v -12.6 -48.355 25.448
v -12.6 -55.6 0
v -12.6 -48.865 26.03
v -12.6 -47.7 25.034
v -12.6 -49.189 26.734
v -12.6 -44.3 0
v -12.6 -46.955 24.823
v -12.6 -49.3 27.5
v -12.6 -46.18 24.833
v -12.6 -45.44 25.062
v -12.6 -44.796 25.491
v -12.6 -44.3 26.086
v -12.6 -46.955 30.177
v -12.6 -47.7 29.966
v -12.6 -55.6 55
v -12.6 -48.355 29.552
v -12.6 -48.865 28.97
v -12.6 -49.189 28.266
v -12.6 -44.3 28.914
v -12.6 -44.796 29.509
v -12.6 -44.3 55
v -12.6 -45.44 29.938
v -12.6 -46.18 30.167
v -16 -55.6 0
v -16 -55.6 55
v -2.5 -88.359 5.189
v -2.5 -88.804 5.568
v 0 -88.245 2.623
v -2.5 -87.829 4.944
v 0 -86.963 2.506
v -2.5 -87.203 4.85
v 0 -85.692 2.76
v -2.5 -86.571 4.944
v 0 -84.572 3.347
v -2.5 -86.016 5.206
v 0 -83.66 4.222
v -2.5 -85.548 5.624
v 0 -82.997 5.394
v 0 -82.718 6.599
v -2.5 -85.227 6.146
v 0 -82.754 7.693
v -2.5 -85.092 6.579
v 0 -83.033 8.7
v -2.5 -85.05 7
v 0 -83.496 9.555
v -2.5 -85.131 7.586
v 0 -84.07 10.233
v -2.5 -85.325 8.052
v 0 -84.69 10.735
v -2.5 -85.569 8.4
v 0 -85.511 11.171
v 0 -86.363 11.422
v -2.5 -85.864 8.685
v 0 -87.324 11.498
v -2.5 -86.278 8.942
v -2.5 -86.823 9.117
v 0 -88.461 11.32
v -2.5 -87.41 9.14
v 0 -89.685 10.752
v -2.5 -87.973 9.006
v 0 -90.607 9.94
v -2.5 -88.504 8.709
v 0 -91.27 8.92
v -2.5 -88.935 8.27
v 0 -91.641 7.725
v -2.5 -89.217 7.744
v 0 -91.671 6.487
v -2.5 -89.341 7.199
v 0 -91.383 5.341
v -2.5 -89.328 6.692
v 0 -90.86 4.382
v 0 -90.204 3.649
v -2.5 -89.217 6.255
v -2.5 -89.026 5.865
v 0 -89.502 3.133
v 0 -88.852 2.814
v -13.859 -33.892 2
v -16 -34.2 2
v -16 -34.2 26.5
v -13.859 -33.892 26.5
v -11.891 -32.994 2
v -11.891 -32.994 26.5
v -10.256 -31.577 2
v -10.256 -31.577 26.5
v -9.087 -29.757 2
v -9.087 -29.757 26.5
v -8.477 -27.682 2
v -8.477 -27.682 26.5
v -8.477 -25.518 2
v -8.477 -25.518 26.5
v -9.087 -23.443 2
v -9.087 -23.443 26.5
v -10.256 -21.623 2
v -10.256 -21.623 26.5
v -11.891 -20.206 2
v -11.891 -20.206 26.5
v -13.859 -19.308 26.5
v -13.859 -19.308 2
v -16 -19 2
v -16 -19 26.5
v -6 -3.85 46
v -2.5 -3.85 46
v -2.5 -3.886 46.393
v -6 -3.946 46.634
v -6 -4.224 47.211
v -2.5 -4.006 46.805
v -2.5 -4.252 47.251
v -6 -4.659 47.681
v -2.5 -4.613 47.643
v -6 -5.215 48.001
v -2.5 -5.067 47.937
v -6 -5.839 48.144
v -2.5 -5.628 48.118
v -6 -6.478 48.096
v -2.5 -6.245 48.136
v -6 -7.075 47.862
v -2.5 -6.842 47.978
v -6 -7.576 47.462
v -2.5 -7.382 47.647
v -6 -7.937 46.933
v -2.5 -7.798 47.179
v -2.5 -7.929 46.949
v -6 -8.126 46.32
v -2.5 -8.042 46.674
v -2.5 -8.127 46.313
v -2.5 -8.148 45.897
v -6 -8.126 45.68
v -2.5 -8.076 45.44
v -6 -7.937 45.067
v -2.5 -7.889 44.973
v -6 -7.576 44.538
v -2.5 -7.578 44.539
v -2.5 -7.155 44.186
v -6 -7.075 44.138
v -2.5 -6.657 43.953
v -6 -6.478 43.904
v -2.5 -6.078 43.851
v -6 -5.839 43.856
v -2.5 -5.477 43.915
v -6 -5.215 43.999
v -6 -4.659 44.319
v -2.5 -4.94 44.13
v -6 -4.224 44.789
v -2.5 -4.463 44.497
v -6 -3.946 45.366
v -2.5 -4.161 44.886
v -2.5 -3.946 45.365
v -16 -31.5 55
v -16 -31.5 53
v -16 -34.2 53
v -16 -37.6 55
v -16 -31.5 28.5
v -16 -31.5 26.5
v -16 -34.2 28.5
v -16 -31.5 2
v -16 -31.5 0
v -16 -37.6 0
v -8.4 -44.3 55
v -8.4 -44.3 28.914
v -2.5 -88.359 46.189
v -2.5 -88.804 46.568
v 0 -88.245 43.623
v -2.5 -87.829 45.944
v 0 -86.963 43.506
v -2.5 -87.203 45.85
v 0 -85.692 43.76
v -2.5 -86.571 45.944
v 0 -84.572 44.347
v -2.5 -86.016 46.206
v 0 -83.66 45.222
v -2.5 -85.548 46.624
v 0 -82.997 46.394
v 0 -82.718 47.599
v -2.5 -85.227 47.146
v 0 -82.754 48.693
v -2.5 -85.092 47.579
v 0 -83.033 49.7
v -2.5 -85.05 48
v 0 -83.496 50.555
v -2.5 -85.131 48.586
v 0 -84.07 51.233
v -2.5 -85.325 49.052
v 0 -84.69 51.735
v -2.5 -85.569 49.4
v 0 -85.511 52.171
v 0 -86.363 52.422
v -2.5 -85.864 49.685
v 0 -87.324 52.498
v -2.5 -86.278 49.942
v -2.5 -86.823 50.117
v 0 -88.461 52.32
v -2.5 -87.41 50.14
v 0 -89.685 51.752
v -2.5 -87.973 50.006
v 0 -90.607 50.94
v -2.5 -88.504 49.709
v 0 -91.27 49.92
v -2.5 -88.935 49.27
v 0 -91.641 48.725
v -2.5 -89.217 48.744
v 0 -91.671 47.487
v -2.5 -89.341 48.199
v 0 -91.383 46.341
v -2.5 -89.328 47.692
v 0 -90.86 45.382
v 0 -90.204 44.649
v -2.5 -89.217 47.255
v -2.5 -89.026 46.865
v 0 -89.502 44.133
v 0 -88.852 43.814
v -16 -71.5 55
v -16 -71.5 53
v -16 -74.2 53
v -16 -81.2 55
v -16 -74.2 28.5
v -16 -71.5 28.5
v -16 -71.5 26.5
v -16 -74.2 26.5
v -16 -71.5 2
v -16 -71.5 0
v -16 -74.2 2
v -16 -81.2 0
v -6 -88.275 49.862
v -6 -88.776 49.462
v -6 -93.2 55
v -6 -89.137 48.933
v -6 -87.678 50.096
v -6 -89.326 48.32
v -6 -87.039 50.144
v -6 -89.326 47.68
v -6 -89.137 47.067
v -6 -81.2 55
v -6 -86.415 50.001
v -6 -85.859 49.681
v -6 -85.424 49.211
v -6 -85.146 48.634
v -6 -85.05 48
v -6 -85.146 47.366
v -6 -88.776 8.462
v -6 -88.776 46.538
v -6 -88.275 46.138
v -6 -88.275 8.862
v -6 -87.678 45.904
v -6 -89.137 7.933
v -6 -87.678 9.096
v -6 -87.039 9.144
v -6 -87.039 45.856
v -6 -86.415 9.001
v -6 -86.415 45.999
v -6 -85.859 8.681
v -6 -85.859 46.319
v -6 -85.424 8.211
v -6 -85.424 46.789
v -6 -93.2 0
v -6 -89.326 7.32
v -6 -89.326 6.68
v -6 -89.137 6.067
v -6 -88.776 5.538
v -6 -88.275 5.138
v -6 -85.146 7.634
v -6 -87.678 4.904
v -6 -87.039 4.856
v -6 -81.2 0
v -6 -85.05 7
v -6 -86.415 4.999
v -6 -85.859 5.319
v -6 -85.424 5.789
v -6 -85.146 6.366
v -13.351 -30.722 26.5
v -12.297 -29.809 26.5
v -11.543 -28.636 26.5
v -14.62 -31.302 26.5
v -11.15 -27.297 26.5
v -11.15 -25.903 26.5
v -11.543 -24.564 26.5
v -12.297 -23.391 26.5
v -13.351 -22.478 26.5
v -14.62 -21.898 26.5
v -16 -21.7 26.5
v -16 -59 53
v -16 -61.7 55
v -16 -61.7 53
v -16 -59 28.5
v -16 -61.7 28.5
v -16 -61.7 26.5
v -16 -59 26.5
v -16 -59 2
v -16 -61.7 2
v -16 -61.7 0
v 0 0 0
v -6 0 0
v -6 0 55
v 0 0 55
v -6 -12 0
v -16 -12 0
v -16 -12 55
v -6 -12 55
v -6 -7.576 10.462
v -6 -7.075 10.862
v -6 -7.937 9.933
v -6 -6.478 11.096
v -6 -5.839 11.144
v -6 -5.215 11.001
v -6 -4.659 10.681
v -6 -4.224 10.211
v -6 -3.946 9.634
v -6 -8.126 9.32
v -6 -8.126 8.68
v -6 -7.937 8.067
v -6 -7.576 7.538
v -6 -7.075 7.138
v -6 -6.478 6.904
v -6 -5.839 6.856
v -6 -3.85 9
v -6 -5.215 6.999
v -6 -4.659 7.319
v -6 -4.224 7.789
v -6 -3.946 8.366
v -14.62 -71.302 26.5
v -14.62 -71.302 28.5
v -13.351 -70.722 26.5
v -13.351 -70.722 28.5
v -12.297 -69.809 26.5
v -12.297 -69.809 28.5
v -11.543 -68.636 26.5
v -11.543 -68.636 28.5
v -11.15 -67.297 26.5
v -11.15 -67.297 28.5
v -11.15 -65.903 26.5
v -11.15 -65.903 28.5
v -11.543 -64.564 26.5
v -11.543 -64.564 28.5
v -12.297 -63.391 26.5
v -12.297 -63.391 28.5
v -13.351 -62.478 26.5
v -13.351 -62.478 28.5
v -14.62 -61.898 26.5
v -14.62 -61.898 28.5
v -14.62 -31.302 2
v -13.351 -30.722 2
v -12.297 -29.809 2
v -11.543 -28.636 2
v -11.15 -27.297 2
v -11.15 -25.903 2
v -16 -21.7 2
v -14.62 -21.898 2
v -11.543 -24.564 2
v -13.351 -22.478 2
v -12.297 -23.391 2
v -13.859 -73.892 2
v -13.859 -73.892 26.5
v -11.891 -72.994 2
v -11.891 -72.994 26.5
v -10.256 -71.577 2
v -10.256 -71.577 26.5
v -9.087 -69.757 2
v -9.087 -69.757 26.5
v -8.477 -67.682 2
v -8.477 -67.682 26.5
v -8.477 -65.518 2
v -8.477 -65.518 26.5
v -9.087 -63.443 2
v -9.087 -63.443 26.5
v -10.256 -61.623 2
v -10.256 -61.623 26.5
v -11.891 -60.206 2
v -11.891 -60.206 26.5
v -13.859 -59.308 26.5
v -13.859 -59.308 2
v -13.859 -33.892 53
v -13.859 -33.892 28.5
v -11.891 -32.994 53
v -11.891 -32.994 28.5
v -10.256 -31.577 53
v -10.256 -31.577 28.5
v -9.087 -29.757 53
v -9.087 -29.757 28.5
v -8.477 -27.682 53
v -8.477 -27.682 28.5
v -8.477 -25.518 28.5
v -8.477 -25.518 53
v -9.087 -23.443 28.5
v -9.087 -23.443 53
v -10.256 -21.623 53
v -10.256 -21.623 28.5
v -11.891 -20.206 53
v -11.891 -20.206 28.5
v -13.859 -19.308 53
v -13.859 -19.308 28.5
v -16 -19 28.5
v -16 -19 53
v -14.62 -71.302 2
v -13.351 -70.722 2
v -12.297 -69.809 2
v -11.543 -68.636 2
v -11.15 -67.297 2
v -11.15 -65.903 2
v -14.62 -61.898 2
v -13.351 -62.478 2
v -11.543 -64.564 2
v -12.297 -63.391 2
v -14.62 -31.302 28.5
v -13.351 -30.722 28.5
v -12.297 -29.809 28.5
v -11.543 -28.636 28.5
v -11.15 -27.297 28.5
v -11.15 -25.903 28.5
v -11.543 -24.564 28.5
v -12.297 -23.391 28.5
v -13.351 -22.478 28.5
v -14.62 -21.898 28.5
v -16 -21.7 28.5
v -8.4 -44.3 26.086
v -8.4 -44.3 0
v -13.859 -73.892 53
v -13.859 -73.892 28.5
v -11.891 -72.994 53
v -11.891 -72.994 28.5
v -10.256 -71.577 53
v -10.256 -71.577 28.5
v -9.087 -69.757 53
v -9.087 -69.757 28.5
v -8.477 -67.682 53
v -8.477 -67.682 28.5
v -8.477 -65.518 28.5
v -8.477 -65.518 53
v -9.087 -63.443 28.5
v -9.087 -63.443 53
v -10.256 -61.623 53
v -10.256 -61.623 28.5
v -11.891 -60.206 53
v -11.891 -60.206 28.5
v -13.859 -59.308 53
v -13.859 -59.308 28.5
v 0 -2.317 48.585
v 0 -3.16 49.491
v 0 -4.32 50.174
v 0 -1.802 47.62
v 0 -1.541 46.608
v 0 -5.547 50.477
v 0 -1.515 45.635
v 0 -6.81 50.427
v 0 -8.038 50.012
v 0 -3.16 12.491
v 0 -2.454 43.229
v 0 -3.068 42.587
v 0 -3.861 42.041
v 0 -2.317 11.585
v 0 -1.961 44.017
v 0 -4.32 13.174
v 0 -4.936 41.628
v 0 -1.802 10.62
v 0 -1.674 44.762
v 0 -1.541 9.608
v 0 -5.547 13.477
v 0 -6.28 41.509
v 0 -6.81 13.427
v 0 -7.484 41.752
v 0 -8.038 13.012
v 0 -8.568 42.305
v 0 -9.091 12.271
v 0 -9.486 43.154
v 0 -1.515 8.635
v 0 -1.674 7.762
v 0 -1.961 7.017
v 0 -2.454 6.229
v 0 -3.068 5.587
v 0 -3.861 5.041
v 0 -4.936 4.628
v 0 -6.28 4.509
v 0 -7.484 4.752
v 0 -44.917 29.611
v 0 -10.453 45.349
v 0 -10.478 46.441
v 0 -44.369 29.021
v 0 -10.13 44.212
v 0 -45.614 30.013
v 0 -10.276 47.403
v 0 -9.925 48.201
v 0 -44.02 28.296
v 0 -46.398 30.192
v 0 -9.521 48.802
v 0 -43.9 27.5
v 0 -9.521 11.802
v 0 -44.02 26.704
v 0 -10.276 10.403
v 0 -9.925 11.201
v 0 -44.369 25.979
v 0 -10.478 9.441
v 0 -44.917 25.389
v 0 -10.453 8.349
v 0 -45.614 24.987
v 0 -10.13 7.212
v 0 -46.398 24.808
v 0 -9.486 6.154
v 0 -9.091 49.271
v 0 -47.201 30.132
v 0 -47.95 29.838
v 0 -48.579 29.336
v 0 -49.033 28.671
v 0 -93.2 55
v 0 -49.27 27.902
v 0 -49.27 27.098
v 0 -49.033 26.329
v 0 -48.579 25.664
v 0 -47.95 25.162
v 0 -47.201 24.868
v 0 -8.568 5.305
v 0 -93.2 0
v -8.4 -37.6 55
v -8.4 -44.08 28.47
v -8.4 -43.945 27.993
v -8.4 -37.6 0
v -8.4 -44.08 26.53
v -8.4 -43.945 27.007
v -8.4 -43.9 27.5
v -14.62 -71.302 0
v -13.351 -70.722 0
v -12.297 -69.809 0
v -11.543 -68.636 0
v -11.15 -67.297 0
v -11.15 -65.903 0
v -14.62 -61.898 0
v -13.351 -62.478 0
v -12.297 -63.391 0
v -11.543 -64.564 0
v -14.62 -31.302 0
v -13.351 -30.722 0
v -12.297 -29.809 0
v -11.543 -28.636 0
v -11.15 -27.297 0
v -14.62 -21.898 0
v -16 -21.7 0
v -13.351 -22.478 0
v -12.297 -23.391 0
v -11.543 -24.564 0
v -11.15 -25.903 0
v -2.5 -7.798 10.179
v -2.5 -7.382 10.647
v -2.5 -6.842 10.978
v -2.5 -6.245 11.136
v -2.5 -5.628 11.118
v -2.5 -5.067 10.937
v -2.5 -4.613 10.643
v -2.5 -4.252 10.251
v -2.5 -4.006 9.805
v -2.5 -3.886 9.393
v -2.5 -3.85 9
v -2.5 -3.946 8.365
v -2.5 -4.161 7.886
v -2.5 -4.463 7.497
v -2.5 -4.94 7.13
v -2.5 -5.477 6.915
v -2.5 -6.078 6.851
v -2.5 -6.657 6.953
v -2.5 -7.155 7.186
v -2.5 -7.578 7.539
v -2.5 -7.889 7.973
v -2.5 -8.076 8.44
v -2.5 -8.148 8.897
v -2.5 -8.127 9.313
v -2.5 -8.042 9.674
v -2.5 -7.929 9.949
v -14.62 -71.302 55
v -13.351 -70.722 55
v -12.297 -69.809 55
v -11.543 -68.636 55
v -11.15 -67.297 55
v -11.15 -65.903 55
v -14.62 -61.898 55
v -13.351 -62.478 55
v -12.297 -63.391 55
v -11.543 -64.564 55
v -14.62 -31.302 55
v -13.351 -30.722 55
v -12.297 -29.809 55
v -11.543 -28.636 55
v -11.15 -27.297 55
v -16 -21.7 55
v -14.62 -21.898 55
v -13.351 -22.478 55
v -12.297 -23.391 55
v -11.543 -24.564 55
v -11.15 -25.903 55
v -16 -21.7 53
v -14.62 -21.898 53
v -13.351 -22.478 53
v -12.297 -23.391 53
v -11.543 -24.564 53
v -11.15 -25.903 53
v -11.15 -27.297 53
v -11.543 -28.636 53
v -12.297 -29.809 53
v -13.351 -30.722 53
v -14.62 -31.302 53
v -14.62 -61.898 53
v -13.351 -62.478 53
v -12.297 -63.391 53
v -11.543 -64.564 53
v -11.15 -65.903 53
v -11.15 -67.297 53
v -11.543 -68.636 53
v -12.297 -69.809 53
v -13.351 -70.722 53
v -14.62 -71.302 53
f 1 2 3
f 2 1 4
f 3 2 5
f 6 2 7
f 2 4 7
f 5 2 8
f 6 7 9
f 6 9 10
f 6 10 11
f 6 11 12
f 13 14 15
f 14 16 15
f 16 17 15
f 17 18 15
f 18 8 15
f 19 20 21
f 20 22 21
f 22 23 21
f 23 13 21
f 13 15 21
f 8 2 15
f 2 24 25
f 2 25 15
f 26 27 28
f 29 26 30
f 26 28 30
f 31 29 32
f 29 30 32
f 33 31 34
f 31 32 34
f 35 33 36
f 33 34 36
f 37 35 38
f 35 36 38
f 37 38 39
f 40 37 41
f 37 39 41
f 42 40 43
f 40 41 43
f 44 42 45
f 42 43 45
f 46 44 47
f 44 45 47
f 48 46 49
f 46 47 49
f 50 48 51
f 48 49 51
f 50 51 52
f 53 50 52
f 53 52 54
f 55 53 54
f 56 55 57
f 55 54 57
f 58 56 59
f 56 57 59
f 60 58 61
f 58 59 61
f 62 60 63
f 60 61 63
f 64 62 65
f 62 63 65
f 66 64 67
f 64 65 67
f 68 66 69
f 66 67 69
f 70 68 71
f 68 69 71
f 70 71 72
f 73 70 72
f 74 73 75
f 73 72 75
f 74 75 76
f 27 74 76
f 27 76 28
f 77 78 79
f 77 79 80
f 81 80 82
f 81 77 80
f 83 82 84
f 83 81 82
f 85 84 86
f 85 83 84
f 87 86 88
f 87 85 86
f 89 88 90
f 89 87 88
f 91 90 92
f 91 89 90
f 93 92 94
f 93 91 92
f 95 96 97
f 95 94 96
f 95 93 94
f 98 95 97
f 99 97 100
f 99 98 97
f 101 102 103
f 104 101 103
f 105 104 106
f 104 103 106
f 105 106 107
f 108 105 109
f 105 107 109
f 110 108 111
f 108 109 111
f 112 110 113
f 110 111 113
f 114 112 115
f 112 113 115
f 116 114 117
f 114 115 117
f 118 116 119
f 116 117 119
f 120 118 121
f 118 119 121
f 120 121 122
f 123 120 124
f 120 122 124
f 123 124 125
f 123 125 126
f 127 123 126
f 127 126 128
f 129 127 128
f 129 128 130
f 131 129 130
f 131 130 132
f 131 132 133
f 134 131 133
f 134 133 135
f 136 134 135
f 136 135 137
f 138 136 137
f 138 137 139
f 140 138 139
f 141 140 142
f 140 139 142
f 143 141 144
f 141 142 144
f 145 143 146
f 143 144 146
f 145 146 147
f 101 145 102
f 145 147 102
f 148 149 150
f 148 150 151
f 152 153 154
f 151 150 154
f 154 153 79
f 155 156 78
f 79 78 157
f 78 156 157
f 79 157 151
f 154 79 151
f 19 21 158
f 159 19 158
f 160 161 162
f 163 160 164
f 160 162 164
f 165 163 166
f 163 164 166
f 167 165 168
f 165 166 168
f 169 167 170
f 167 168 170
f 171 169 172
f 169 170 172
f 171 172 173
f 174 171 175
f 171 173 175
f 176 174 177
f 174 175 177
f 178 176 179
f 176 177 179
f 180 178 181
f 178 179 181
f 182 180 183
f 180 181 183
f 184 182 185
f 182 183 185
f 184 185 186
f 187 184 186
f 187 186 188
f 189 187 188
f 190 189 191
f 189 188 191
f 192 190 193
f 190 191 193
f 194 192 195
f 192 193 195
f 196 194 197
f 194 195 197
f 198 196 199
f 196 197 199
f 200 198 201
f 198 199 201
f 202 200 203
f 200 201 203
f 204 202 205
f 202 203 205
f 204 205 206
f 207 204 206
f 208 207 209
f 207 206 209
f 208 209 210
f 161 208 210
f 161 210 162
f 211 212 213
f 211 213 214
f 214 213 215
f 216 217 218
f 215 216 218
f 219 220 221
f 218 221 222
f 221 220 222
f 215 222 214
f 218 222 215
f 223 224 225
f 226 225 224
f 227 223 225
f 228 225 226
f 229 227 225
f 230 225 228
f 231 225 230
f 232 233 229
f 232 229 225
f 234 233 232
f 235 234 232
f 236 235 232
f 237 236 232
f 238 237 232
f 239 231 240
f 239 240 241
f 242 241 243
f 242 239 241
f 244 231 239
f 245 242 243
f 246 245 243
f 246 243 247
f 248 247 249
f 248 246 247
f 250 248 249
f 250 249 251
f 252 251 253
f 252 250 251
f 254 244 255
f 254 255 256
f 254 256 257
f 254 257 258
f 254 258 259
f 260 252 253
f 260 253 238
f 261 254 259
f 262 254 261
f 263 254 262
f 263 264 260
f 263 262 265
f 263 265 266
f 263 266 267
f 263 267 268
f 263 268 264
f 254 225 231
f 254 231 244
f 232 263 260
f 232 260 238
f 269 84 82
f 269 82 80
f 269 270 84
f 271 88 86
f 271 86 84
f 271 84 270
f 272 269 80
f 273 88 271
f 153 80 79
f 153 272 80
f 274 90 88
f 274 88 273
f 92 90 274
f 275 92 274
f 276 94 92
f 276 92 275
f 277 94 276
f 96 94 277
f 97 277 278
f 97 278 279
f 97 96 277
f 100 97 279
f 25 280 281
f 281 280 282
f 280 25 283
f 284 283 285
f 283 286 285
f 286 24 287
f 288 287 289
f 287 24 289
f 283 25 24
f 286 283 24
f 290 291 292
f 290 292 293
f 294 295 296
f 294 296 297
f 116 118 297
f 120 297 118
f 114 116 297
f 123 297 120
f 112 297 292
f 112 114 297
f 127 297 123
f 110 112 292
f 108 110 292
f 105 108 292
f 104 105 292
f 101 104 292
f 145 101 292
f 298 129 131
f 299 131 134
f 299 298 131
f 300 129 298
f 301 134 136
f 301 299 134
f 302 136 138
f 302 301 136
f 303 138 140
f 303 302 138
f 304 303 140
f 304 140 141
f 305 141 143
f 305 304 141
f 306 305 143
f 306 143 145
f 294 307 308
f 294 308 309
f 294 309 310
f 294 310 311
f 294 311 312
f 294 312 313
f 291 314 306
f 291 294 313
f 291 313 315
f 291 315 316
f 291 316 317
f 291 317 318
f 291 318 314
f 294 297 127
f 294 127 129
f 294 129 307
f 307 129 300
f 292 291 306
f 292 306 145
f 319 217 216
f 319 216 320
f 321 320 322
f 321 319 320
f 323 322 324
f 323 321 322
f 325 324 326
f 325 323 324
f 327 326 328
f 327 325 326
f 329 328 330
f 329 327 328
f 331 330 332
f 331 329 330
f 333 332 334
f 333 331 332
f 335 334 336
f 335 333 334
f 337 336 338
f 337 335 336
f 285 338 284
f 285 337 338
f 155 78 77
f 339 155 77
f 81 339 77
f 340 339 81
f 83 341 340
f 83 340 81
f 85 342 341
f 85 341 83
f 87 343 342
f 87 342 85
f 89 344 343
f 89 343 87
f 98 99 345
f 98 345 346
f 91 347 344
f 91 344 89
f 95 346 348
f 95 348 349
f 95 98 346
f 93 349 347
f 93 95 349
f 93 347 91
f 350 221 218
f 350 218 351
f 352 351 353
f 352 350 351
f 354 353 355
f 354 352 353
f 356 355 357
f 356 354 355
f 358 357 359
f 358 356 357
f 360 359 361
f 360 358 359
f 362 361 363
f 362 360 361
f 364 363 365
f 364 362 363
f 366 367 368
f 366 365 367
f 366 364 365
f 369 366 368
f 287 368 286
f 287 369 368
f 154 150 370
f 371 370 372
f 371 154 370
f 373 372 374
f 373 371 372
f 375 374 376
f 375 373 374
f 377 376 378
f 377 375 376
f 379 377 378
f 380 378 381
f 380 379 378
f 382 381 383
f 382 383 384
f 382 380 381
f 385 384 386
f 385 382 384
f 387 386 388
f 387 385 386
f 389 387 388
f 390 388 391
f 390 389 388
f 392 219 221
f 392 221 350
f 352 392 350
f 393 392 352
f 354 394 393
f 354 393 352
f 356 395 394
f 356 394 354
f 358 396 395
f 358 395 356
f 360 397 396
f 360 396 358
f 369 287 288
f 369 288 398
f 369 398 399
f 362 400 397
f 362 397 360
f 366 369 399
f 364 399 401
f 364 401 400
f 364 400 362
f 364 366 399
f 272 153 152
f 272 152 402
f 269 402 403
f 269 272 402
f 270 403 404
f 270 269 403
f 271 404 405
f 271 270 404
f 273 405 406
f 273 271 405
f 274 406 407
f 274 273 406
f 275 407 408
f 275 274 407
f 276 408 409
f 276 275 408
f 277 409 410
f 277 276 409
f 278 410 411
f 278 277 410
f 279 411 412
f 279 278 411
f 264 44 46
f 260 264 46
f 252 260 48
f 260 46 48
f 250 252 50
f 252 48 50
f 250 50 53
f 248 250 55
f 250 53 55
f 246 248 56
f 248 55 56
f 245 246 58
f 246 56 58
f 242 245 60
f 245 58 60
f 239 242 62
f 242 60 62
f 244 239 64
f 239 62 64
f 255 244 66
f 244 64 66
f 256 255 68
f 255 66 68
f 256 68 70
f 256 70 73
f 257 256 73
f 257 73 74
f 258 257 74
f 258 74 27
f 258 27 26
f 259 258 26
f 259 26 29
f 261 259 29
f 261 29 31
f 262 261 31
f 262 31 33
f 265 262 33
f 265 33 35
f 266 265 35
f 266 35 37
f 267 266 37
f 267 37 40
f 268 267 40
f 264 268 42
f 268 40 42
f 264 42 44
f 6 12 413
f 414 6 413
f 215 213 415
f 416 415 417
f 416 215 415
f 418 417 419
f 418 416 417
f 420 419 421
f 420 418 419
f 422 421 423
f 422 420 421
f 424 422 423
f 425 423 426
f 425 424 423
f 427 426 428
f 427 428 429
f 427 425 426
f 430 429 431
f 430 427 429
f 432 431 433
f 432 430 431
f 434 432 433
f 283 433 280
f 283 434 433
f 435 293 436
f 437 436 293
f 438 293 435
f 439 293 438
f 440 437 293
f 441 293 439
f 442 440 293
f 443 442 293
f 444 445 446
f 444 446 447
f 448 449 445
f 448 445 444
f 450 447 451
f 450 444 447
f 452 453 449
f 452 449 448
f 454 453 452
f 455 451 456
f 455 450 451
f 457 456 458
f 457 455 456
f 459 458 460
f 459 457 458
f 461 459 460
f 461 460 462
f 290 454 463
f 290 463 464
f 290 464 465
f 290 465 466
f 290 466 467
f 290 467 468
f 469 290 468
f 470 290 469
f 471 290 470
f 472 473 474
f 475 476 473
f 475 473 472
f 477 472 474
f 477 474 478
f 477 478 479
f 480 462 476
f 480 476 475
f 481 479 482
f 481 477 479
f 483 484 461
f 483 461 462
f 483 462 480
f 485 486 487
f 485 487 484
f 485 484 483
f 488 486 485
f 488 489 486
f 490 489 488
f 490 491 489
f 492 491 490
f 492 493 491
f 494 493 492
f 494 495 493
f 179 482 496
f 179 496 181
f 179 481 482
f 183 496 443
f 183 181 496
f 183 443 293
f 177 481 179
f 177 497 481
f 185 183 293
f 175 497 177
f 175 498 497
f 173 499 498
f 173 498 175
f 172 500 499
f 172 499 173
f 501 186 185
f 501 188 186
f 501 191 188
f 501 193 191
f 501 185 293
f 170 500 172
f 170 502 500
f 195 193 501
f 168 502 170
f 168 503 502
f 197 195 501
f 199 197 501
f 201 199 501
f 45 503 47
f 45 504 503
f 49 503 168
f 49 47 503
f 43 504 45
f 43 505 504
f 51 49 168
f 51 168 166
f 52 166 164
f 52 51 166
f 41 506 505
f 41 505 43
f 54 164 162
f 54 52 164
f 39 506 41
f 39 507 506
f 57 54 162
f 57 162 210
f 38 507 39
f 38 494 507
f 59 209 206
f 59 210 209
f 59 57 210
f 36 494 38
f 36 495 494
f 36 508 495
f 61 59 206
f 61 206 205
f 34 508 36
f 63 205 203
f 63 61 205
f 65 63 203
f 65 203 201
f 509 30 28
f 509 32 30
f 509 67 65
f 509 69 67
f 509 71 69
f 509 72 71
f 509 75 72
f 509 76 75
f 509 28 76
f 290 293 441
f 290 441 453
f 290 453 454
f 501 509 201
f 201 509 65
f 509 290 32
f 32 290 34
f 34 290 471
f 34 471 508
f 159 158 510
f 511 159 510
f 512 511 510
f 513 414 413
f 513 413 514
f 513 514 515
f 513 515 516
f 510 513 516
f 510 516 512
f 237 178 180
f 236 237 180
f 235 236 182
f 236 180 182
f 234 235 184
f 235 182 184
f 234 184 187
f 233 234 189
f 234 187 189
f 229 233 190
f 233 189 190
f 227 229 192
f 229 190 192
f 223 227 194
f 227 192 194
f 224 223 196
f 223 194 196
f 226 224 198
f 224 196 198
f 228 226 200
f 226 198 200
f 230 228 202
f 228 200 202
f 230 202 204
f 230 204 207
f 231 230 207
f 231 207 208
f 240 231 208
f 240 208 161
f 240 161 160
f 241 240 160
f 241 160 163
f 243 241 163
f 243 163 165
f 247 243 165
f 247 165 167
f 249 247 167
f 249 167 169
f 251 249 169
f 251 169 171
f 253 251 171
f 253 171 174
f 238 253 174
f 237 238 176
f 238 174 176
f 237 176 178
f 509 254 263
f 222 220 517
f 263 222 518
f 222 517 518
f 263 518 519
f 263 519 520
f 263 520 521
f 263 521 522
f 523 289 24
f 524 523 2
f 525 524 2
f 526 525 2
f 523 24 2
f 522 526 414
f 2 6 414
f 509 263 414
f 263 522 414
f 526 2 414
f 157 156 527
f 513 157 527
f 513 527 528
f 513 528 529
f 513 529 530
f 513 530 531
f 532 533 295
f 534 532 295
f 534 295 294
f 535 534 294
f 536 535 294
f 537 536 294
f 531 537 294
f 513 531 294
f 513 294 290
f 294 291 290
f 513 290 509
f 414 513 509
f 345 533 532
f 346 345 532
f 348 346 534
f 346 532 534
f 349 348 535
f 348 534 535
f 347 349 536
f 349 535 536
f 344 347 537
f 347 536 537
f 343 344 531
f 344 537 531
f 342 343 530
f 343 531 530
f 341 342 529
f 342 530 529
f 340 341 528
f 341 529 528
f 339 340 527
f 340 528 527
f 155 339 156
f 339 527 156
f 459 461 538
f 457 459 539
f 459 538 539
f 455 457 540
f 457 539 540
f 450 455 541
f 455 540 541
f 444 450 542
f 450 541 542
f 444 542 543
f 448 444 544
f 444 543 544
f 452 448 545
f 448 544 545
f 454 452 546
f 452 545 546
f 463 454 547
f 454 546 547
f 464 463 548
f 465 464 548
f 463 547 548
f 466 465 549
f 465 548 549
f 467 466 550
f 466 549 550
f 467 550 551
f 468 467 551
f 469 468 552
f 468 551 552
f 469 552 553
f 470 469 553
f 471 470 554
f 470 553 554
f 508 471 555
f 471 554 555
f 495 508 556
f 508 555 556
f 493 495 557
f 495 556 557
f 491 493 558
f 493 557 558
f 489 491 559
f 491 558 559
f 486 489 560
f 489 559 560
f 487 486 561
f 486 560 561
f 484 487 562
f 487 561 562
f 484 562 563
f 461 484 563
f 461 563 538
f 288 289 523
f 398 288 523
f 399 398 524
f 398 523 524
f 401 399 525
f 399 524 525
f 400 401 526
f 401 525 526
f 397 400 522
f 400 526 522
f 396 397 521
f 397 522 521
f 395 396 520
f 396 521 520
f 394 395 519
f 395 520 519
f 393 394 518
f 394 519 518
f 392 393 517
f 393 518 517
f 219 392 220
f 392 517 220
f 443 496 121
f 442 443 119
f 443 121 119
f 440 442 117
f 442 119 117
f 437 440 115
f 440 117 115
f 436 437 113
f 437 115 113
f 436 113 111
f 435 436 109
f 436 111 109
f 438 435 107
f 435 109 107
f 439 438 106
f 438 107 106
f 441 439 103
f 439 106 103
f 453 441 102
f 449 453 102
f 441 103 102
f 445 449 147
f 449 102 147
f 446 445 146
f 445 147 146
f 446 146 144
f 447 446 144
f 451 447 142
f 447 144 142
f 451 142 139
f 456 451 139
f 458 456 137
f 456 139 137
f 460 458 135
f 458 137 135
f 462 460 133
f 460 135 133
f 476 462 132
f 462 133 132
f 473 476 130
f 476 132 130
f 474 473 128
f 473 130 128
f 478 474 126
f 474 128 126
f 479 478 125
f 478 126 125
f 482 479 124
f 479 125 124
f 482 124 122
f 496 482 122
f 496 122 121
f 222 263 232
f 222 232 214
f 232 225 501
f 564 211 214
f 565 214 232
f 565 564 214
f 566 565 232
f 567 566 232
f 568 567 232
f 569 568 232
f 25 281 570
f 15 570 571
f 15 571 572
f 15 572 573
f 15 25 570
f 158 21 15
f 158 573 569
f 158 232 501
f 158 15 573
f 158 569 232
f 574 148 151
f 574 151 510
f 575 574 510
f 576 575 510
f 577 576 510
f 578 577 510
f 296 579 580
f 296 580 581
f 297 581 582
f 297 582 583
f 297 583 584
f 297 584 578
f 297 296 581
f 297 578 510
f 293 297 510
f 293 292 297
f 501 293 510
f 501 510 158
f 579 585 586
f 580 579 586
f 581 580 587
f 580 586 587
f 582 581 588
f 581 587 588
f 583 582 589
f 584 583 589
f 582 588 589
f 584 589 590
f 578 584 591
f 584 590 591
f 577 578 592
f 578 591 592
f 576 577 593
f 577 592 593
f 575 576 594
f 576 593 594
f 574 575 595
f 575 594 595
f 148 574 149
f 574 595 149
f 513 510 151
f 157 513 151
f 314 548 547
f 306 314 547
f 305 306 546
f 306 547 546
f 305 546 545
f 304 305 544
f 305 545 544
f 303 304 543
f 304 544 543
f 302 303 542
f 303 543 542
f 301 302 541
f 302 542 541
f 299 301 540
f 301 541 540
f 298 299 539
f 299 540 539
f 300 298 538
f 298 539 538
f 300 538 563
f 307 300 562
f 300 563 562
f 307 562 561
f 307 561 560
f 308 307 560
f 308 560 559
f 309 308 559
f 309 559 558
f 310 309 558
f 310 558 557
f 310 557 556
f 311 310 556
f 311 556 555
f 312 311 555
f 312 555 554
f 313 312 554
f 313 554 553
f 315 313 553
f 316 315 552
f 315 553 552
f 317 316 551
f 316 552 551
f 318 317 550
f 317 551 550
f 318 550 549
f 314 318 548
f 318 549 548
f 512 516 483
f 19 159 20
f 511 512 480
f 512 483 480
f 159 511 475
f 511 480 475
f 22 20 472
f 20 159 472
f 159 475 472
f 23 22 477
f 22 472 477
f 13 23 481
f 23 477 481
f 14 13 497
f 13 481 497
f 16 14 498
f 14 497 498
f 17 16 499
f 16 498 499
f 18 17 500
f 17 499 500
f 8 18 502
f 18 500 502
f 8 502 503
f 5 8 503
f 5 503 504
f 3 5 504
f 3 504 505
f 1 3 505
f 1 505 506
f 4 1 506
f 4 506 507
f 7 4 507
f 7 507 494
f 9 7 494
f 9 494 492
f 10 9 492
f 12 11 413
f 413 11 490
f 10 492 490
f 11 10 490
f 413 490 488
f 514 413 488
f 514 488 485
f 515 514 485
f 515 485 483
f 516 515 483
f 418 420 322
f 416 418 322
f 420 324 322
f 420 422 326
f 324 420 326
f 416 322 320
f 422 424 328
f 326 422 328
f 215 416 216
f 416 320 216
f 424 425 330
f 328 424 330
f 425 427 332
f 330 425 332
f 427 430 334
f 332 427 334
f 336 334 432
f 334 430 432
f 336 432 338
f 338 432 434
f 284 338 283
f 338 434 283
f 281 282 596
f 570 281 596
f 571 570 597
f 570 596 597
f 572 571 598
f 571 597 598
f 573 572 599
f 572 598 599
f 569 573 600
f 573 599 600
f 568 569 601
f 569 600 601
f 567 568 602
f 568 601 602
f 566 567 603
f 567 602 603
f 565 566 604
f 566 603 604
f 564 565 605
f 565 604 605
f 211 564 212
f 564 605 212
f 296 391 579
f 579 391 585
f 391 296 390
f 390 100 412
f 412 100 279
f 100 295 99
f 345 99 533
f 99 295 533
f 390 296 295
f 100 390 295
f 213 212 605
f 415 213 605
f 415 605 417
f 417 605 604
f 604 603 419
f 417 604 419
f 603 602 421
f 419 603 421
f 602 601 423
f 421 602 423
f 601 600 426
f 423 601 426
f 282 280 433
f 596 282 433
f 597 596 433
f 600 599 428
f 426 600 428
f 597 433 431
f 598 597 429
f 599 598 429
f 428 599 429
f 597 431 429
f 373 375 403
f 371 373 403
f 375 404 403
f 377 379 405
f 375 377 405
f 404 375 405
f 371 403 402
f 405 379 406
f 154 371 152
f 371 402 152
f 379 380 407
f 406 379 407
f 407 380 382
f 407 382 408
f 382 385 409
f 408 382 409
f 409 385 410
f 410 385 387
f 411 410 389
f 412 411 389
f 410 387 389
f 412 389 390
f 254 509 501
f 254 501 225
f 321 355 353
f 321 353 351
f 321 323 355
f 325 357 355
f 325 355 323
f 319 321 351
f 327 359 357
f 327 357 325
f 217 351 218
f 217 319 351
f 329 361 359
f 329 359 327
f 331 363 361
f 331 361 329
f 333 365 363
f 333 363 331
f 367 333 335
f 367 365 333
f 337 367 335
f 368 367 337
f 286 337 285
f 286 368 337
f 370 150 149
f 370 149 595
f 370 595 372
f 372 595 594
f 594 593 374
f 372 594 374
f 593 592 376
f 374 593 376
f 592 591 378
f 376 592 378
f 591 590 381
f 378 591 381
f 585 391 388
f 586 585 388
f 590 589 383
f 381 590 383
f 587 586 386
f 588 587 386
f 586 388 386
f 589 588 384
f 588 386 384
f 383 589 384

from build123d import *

# Parameters (mm, degrees)
BOSS_EXTRUDE1_DEPTH = 55
BOSS_EXTRUDE2_START = 2
BOSS_EXTRUDE2_DEPTH = 2
BOSS_EXTRUDE3_START = 2
BOSS_EXTRUDE3_DEPTH = 2
BOSS_EXTRUDE5_START = 2
BOSS_EXTRUDE5_DEPTH = 2
BOSS_EXTRUDE6_DEPTH = 2
SKETCH7_W           = 3.4
SKETCH7_H           = 11.3
CUT_EXTRUDE2_DEPTH  = 55
SKETCH8_R           = 2.15
CUT_EXTRUDE3_DEPTH  = 6
CUT_EXTRUDE4_REACH  = 111.395
SKETCH9_R           = 2.7
LPATTERN1_COUNT     = 2
LPATTERN1_PITCH     = 37
LPATTERN2_COUNT     = 2
LPATTERN2_PITCH     = 41


with BuildPart() as part:
    # Sketch1 → Boss-Extrude1 (new body)
    with BuildSketch(Plane.XY):
        with BuildLine():
            Line((0, 0), (0, -93.2))
            Line((0, -93.2), (-6, -93.2))
            Line((-6, -93.2), (-6, -81.2))
            Line((-6, -81.2), (-16, -81.2))
            Line((-16, -81.2), (-16, -74.2))
            ThreePointArc((-16, -74.2), (-8.4, -66.6), (-16, -59))
            Line((-16, -59), (-16, -44.3))
            Line((-16, -44.3), (-8.4, -44.3))
            Line((-8.4, -44.3), (-8.4, -37.6))
            Line((-8.4, -37.6), (-16, -37.6))
            Line((-16, -37.6), (-16, -34.2))
            ThreePointArc((-16, -34.2), (-8.4, -26.6), (-16, -19))
            Line((-16, -19), (-16, -12))
            Line((-16, -12), (-6, -12))
            Line((-6, -12), (-6, 0))
            Line((-6, 0), (0, 0))
        make_face()
    extrude(amount=BOSS_EXTRUDE1_DEPTH)

    # Sketch2 → Boss-Extrude2 (add)
    with BuildSketch(Plane(origin=(0, 0, 28.5), x_dir=(-1, 0, 0), z_dir=(0, 0, -1)).offset(BOSS_EXTRUDE2_START)):
        with BuildLine():
            Line((16, -34.2), (16, -31.5))
            ThreePointArc((16, -31.5), (11.1, -26.6), (16, -21.7))
            Line((16, -21.7), (16, -19))
            ThreePointArc((16, -19), (8.4, -26.6), (16, -34.2))
        make_face()
    extrude(amount=-BOSS_EXTRUDE2_DEPTH)

    # Sketch3 → Boss-Extrude3 (add)
    with BuildSketch(Plane(origin=(0, 0, 28.5), x_dir=(-1, 0, 0), z_dir=(0, 0, -1)).offset(BOSS_EXTRUDE3_START)):
        with BuildLine():
            Line((16, -74.2), (16, -71.5))
            ThreePointArc((16, -71.5), (11.1, -66.6), (16, -61.7))
            Line((16, -61.7), (16, -59))
            ThreePointArc((16, -59), (8.4, -66.6), (16, -74.2))
        make_face()
    extrude(amount=-BOSS_EXTRUDE3_DEPTH)

    # Sketch4 → Boss-Extrude5 (add)
    with BuildSketch(Plane(origin=(0, 0, 2), x_dir=(-1, 0, 0), z_dir=(0, 0, -1)).offset(BOSS_EXTRUDE5_START)):
        with BuildLine():
            Line((16, -59), (16, -61.7))
            ThreePointArc((16, -61.7), (11.1, -66.6), (16, -71.5))
            Line((16, -71.5), (16, -74.2))
            ThreePointArc((16, -74.2), (8.4, -66.6), (16, -59))
        make_face()
        with BuildLine():
            Line((16, -19), (16, -21.7))
            ThreePointArc((16, -21.7), (11.1, -26.6), (16, -31.5))
            Line((16, -31.5), (16, -34.2))
            ThreePointArc((16, -34.2), (8.4, -26.6), (16, -19))
        make_face()
    extrude(amount=-BOSS_EXTRUDE5_DEPTH)

    # Sketch5 → Boss-Extrude6 (add)
    with BuildSketch(Plane(origin=(0, 0, 53), x_dir=(-1, 0, 0), z_dir=(0, 0, -1))):
        with BuildLine():
            Line((16, -19), (16, -21.7))
            ThreePointArc((16, -21.7), (11.1, -26.6), (16, -31.5))
            Line((16, -31.5), (16, -34.2))
            ThreePointArc((16, -34.2), (8.4, -26.6), (16, -19))
        make_face()
        with BuildLine():
            Line((16, -59), (16, -61.7))
            ThreePointArc((16, -61.7), (11.1, -66.6), (16, -71.5))
            Line((16, -71.5), (16, -74.2))
            ThreePointArc((16, -74.2), (8.4, -66.6), (16, -59))
        make_face()
    extrude(amount=-BOSS_EXTRUDE6_DEPTH)

    # Sketch7 → Cut-Extrude2 (cut)
    with BuildSketch(Plane.XY.offset(55)):
        with Locations((-14.3, -49.95)):
            Rectangle(SKETCH7_W, SKETCH7_H)
    extrude(amount=-CUT_EXTRUDE2_DEPTH, mode=Mode.SUBTRACT)

    # Sketch8 → Cut-Extrude3 (cut)
    with BuildSketch(Plane(origin=(0, 0, 0), x_dir=(0, 0, -1), z_dir=(1, 0, 0))):
        with Locations(Location((-46, -6, 0), (0, 0, 90))):
            Circle(SKETCH8_R)
        with Locations(Location((-9, -6, 0), (0, 0, 90))):
            Circle(SKETCH8_R)
        with Locations(Location((-7, -87.2, 0), (0, 0, 90))):
            Circle(SKETCH8_R)
        with Locations(Location((-48, -87.2, 0), (0, 0, 90))):
            Circle(SKETCH8_R)
    extrude(amount=-CUT_EXTRUDE3_DEPTH, mode=Mode.SUBTRACT)

    # Cut-Extrude4: up to this face of the body (flat: up to its plane)
    cut_extrude4_end = Plane(part.part.faces().sort_by_distance((-12.6, -49.95, 27.5))[0])
    # Sketch9 → Cut-Extrude4 (cut, up to the picked face)
    with BuildSketch(Plane(origin=(0, 0, 0), x_dir=(0, 0, -1), z_dir=(1, 0, 0)), mode=Mode.PRIVATE) as cut_extrude4_sk1:
        with Locations(Location((-27.5, -46.6, 0), (0, 0, 90))):
            Circle(SKETCH9_R)
    cut_extrude4_tool1 = split(extrude(cut_extrude4_sk1.sketch, amount=-CUT_EXTRUDE4_REACH, mode=Mode.PRIVATE), bisect_by=cut_extrude4_end, keep=Keep.BOTH, mode=Mode.PRIVATE)
    add(cut_extrude4_tool1.solids().sort_by(Axis((0, -46.6, 27.5), (-1, 0, 0)))[0], mode=Mode.SUBTRACT)

    # Cut-Loft1: read off the stored shape, not the designer's step
    # Cut-Loft1: loft between two sections, ruled curve by curve
    cut_loft1_from = [
        Edge.make_bspline([(0, -9.090752309, 49.270665095), (0, -2.54942212, 55.452169714), (0, 3.632082499, 48.910839524), (0, -2.909247691, 42.729334905), (0, -9.45057788, 36.547830286), (0, -15.632082499, 43.089160476), (0, -9.090752309, 49.270665095)], [0, 0, 0, 0, 0.5, 0.5, 0.5, 1, 1, 1, 1], 3, [1, 0.333333333, 0.333333333, 1, 0.333333333, 0.333333333, 1]),
    ]
    cut_loft1_to = [
        Edge.make_bspline([(-2.5, -7.797727139, 47.179269746), (-2.5, -5.439187646, 50.774724024), (-2.5, -1.843733369, 48.416184531), (-2.5, -4.202272861, 44.820730254), (-2.5, -6.560812354, 41.225275976), (-2.5, -10.156266631, 43.583815469), (-2.5, -7.797727139, 47.179269746)], [0, 0, 0, 0, 0.5, 0.5, 0.5, 1, 1, 1, 1], 3, [1, 0.333333333, 0.333333333, 1, 0.333333333, 0.333333333, 1]),
    ]
    cut_loft1 = Solid(Shell([*[Face.make_surface_from_curves(cut_loft1_from[k], cut_loft1_to[k]) for k in range(1)], Face(Wire(cut_loft1_from)), Face(Wire(cut_loft1_to))]))
    add(cut_loft1, mode=Mode.SUBTRACT)

    # LPattern1: Cut-Loft1 ×2
    with Locations(*[(0, 0, -i * LPATTERN1_PITCH) for i in range(1, LPATTERN1_COUNT)]):
        add(cut_loft1, mode=Mode.SUBTRACT)

    # Cut-Loft2: read off the stored shape, not the designer's step
    # Cut-Loft2: loft between two sections, ruled curve by curve
    cut_loft2_from = [
        Edge.make_bspline([(-2.5, -88.803773463, 46.568074485), (-2.5, -85.939922433, 43.36052756), (-2.5, -82.732375507, 46.22437859), (-2.5, -85.596226537, 49.431925515), (-2.5, -88.460077567, 52.63947244), (-2.5, -91.667624493, 49.77562141), (-2.5, -88.803773463, 46.568074485)], [0, 0, 0, 0, 0.5, 0.5, 0.5, 1, 1, 1, 1], 3, [1, 0.333333333, 0.333333333, 1, 0.333333333, 0.333333333, 1]),
    ]
    cut_loft2_to = [
        Edge.make_bspline([(0, -88.245004687, 43.623018711), (0, -79.491042109, 41.533009337), (0, -77.401032735, 50.286971915), (0, -86.154995313, 52.376981289), (0, -94.908957891, 54.466990663), (0, -96.998967265, 45.713028085), (0, -88.245004687, 43.623018711)], [0, 0, 0, 0, 0.5, 0.5, 0.5, 1, 1, 1, 1], 3, [1, 0.333333333, 0.333333333, 1, 0.333333333, 0.333333333, 1]),
    ]
    cut_loft2 = Solid(Shell([*[Face.make_surface_from_curves(cut_loft2_from[k], cut_loft2_to[k]) for k in range(1)], Face(Wire(cut_loft2_from)), Face(Wire(cut_loft2_to))]))
    add(cut_loft2, mode=Mode.SUBTRACT)

    # LPattern2: Cut-Loft2 ×2
    with Locations(*[(0, 0, -i * LPATTERN2_PITCH) for i in range(1, LPATTERN2_COUNT)]):
        add(cut_loft2, mode=Mode.SUBTRACT)


solid = part.part
